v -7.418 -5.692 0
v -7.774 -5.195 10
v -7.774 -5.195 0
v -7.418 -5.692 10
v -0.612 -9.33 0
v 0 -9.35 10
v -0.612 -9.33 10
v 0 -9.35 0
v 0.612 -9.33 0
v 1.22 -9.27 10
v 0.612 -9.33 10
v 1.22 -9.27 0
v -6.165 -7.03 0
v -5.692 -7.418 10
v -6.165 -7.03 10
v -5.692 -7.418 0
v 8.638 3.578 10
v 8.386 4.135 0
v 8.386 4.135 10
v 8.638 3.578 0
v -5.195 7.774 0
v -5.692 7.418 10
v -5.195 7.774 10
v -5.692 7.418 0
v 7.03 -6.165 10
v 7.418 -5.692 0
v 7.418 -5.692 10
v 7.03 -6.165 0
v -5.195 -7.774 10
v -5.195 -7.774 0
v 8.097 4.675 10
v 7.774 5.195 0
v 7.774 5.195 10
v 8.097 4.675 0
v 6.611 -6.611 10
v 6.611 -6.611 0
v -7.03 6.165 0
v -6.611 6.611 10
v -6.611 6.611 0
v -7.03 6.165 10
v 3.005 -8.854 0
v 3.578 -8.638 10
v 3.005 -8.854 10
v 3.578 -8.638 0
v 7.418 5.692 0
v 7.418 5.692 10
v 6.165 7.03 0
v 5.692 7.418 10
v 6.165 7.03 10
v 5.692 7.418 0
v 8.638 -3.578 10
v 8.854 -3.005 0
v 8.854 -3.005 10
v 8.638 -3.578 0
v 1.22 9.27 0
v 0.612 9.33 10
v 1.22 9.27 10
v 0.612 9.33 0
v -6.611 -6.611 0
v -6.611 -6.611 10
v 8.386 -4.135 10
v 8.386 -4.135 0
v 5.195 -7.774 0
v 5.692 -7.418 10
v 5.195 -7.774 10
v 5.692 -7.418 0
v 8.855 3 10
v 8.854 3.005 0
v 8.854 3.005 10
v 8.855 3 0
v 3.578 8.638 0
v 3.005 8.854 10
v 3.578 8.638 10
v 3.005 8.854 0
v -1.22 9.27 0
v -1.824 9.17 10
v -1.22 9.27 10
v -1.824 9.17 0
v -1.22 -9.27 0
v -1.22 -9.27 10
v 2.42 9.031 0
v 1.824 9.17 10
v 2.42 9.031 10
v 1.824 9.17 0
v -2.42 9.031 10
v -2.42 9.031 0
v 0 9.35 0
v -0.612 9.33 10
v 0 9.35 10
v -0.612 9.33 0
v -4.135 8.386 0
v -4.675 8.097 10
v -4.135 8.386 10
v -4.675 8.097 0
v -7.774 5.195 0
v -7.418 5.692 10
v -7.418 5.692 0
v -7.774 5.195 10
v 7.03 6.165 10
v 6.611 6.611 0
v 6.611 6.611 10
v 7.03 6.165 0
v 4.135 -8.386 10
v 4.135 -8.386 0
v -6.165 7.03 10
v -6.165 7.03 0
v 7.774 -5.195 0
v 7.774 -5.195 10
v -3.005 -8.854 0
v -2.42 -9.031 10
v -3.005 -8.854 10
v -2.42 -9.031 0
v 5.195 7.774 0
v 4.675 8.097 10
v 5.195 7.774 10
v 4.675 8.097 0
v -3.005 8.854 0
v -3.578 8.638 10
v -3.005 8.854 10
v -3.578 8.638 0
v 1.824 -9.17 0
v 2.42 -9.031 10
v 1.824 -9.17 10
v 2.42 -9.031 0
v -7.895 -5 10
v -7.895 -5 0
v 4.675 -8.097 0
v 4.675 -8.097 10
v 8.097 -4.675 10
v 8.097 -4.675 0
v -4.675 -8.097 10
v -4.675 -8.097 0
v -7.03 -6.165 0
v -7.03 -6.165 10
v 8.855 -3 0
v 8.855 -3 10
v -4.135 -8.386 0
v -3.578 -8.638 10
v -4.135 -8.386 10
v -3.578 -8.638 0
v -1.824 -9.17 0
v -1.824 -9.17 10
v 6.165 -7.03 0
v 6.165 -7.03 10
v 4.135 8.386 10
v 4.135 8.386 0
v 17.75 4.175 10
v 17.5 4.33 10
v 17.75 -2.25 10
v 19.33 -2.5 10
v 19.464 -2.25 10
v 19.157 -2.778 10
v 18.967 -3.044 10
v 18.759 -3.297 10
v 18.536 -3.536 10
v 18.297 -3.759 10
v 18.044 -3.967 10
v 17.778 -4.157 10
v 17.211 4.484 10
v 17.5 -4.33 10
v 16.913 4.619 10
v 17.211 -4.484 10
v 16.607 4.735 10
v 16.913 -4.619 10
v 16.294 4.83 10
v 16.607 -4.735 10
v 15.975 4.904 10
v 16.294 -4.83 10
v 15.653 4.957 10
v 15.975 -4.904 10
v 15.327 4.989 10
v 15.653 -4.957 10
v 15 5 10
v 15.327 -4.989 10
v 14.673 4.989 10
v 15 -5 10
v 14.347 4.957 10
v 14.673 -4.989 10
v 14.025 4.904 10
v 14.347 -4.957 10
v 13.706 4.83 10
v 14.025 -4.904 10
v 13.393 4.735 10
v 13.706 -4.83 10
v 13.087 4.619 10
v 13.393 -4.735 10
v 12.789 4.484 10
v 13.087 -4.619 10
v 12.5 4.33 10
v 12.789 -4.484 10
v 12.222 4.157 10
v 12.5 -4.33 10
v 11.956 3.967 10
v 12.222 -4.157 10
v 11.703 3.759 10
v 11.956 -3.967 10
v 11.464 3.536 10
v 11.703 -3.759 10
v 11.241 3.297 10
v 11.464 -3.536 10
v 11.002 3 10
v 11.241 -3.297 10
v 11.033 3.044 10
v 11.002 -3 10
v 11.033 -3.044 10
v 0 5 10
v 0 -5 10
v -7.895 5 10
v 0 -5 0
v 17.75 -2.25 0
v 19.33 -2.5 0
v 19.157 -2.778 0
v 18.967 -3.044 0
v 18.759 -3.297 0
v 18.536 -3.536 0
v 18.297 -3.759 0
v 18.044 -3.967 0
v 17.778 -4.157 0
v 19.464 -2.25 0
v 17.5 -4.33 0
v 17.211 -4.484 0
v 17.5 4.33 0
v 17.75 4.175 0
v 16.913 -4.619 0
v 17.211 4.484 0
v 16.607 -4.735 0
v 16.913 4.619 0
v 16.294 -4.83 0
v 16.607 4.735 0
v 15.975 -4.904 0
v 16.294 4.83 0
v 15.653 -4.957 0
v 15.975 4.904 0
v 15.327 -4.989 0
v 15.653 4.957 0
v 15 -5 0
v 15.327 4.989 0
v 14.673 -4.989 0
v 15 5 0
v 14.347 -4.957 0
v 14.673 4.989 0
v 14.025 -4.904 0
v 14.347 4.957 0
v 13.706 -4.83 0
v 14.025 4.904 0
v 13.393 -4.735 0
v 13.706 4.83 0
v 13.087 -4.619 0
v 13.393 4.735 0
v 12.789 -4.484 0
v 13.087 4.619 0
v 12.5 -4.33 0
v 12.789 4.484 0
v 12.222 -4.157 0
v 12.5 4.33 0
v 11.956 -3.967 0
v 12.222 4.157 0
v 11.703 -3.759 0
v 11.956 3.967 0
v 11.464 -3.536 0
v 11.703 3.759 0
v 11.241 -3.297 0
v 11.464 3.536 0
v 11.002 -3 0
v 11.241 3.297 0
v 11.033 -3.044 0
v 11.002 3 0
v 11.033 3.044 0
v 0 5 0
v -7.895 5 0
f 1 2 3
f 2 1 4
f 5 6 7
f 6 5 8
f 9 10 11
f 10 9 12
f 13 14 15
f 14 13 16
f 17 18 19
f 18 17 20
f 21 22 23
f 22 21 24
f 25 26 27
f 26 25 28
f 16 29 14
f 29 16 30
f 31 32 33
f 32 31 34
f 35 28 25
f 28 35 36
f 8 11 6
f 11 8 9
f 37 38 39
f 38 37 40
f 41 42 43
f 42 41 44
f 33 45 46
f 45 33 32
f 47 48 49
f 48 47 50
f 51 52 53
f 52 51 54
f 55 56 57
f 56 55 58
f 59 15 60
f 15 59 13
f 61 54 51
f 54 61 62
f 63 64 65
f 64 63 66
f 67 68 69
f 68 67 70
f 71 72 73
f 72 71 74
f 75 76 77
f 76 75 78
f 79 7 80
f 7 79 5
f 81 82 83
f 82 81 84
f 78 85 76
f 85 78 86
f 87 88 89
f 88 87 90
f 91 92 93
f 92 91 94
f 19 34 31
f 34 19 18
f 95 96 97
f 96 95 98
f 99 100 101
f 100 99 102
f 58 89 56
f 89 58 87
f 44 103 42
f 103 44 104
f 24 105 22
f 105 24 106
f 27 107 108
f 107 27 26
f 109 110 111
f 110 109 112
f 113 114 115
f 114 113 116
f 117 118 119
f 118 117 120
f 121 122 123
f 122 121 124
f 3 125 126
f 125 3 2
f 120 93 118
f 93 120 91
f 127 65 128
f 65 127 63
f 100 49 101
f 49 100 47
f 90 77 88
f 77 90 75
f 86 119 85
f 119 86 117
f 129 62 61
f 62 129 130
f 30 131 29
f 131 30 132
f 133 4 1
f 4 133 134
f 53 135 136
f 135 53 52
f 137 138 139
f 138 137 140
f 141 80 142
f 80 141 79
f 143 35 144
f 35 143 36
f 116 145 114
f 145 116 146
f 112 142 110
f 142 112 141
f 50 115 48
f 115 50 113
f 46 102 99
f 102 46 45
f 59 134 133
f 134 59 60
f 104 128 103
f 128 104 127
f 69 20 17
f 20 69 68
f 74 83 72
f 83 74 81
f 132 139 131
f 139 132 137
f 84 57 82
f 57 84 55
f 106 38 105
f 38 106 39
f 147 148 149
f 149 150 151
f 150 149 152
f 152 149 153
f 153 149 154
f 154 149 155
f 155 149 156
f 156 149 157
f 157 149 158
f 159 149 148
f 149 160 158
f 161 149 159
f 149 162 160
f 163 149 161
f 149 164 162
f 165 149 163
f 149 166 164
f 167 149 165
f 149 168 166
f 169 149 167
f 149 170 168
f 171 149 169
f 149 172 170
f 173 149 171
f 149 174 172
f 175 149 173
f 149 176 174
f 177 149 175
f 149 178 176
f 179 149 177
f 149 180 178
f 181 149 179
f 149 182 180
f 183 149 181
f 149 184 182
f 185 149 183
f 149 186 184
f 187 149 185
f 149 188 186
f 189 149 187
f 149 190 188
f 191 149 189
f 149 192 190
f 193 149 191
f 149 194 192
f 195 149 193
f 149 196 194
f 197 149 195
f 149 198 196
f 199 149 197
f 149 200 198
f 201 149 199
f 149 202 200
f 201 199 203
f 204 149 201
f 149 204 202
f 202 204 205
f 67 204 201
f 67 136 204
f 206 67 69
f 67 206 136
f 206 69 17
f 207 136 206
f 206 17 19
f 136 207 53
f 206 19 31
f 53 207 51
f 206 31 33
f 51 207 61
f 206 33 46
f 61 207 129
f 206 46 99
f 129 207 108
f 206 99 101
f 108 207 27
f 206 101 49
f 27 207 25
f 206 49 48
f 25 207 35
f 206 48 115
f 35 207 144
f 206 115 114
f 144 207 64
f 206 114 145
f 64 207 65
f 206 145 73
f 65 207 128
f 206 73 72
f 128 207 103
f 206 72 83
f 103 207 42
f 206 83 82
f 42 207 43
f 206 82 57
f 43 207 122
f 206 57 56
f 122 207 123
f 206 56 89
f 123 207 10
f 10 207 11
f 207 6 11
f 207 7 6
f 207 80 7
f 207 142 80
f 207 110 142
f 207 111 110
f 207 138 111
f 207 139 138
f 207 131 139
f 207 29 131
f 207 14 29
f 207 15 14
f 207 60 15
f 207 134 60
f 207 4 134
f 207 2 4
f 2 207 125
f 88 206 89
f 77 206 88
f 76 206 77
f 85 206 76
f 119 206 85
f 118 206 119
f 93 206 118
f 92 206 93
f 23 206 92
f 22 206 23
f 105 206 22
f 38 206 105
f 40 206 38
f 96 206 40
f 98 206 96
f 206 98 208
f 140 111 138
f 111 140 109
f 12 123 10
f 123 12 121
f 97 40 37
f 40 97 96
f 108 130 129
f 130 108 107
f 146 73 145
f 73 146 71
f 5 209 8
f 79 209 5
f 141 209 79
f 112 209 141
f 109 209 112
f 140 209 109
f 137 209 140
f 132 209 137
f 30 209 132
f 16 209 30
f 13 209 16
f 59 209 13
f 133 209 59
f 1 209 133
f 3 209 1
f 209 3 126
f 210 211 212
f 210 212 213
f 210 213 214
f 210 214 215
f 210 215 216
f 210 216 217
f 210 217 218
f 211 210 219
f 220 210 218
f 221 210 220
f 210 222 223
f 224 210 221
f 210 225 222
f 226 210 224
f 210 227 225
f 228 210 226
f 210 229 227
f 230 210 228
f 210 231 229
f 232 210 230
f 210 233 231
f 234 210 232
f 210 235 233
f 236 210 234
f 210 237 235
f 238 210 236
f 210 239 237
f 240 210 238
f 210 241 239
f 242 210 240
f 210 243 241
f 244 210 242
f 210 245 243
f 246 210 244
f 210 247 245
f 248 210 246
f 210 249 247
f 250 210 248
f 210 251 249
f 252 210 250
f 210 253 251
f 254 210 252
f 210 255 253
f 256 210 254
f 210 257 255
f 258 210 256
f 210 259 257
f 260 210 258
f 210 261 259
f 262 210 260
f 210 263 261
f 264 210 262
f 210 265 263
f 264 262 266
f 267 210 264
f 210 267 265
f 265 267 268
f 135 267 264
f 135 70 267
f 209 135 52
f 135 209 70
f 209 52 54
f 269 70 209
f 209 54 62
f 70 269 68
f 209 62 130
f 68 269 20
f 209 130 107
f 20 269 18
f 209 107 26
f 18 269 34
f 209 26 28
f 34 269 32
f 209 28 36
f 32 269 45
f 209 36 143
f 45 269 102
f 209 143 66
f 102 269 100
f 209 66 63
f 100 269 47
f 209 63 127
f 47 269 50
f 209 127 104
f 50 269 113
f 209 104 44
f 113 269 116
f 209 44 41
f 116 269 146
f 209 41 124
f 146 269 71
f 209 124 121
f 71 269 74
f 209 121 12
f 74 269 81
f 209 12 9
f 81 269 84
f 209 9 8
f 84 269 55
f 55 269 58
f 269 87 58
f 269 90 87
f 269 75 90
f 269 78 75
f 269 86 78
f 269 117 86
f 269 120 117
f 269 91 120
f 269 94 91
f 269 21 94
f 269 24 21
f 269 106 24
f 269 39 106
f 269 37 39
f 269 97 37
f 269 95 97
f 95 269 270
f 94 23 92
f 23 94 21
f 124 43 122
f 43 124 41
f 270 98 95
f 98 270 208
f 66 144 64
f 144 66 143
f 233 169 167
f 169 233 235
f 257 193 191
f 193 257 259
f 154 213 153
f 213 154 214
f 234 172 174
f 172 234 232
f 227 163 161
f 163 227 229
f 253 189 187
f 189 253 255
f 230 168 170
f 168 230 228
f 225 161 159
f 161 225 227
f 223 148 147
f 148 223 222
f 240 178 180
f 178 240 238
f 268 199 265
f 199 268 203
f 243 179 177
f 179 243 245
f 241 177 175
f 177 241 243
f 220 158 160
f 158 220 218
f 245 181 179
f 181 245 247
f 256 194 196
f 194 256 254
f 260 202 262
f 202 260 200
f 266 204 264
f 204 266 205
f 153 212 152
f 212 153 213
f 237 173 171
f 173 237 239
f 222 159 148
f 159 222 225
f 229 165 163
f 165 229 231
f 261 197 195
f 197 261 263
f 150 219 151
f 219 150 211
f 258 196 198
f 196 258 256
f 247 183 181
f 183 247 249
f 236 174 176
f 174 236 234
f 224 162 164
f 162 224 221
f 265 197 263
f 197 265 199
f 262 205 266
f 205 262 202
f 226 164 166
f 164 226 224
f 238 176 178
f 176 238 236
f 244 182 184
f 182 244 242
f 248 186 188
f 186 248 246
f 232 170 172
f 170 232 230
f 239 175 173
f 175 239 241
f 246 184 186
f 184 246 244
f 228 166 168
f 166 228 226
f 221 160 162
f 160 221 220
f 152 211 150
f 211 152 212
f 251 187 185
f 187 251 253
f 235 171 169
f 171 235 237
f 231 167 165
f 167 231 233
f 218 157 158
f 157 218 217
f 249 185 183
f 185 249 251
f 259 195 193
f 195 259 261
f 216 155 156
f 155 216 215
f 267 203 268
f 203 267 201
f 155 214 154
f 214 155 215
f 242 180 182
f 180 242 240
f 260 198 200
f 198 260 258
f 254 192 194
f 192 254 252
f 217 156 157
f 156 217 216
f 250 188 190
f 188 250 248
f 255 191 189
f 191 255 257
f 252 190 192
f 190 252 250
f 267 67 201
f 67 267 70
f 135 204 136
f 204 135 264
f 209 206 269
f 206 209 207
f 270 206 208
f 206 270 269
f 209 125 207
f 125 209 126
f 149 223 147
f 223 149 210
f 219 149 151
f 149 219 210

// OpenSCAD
// Tubing/stand rod snap-on clip
// Print orientation: flat on bed, z = 0 up to z = height

// ---------------- Parameters ----------------
height      = 10;     // extrusion height (Z)
stand_d     = 12.7;   // stand rod diameter
stand_wall  = 3;      // stand ring wall thickness
stand_open  = 10;     // stand ring opening width (Y)

tub_d       = 6;      // tubing inner diameter
tub_wall    = 2;      // tubing ring wall thickness
tub_x       = 15;     // tubing ring centre X
tub_open    = 4.5;    // tubing ring opening width (Y)

bridge_w    = 6;      // bridge width (Y)
bridge_x0   = 8;      // bridge start X
bridge_x1   = 12;     // bridge end X

eps         = 0.5;    // cutter overshoot past faces
$fn         = 96;     // curve resolution

// ---------------- Derived ----------------
stand_od = stand_d + 2 * stand_wall;   // stand ring outer diameter
tub_od   = tub_d + 2 * tub_wall;       // tubing ring outer diameter

// ---------------- Model ----------------
difference() {
    union() {
        // Stand ring
        cylinder(d = stand_od, h = height);

        // Tubing ring
        translate([tub_x, 0, 0])
            cylinder(d = tub_od, h = height);

        // Solid bridge between rings
        translate([bridge_x0, -bridge_w / 2, 0])
            cube([bridge_x1 - bridge_x0, bridge_w, height]);
    }

    // Stand ring opening: x < 0 and -stand_open/2 < y < stand_open/2
    translate([-stand_od - eps, -stand_open / 2, -eps])
        cube([stand_od + eps, stand_open, height + 2 * eps]);

    // Tubing ring opening: x > tub_x and -tub_open/2 < y < tub_open/2
    translate([tub_x + tub_od / 2 - tub_open / 2, -tub_open / 2, -eps])
        cube([tub_open, tub_od, height + 2 * eps]);
}
